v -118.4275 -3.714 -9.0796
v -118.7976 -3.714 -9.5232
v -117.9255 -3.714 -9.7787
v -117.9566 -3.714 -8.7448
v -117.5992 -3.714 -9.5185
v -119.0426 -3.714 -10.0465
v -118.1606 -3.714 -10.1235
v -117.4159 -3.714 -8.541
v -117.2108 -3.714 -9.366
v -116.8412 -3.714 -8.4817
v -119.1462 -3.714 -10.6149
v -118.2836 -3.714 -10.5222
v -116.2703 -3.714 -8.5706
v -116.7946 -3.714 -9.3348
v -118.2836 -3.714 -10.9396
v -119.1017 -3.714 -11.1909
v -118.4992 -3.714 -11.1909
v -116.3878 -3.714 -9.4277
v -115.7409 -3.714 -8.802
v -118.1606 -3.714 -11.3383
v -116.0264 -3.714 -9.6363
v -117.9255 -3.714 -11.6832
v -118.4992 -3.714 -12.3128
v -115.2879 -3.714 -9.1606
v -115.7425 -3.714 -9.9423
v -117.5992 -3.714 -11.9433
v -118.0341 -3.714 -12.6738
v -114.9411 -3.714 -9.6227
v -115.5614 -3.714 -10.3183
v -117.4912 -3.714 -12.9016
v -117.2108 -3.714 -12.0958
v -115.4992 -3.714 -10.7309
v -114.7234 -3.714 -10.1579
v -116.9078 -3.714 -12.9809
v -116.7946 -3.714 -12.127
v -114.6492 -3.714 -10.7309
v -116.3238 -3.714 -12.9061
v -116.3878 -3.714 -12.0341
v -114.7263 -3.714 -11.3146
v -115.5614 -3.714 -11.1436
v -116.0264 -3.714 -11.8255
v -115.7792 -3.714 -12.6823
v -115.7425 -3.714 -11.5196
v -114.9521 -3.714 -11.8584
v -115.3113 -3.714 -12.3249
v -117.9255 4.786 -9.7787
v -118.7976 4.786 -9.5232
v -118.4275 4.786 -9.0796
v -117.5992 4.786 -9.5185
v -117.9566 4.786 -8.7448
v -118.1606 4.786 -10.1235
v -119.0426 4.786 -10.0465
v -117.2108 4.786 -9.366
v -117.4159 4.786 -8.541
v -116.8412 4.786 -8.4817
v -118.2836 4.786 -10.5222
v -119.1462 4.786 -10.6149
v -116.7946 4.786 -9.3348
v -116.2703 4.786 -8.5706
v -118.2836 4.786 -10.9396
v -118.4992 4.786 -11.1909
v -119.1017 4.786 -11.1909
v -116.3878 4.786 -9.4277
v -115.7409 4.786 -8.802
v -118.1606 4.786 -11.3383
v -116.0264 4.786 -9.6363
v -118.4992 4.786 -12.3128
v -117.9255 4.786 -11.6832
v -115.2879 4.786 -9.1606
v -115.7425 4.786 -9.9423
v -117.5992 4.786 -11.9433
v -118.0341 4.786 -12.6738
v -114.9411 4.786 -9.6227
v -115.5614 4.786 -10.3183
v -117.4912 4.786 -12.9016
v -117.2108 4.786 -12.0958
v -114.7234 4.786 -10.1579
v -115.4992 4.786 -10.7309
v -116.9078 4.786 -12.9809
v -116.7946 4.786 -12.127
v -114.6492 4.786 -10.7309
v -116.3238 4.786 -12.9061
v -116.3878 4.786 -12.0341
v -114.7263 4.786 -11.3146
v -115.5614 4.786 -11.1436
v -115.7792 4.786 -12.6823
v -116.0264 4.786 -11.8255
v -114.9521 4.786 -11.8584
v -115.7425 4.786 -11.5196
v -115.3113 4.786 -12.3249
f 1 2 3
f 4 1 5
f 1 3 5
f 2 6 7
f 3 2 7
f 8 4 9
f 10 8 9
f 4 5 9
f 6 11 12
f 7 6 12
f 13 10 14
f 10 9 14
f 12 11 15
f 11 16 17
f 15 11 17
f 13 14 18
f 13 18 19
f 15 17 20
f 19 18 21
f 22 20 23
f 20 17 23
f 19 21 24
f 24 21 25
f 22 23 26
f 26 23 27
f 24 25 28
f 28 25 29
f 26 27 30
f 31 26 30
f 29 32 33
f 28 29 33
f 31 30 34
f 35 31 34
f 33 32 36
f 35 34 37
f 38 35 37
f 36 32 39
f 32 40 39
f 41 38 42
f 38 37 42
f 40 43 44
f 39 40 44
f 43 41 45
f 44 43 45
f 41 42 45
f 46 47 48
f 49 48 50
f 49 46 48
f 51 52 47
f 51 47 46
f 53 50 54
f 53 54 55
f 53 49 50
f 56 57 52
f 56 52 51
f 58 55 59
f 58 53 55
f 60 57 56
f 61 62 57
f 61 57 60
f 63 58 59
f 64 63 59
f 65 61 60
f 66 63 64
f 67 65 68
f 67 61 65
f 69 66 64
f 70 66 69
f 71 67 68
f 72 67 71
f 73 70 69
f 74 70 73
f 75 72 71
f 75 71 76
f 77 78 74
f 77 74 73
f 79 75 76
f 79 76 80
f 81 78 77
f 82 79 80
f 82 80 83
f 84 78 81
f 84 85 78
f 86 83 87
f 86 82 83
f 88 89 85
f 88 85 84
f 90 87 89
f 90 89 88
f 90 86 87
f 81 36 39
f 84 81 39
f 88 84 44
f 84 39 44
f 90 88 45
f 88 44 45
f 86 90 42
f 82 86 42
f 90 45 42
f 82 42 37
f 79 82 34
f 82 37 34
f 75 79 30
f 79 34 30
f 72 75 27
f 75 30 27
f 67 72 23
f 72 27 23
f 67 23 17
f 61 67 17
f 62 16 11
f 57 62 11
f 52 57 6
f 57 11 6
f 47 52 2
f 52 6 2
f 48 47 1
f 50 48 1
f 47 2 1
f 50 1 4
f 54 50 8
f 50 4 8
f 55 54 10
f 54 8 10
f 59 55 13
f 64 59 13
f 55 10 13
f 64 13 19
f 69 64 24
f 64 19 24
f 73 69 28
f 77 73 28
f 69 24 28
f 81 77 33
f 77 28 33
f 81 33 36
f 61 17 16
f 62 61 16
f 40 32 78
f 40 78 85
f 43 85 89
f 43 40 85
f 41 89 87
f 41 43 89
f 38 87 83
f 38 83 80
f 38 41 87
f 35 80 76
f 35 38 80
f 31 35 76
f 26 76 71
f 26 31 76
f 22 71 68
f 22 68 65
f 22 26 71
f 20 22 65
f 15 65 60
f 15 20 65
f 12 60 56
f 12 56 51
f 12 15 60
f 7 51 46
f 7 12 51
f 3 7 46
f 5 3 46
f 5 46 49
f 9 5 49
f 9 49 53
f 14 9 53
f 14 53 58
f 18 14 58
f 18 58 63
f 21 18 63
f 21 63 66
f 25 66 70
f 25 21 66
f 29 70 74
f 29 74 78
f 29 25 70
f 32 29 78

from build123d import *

# Parameters (mm, degrees)
SKETCH1_R           = 1.4
BOSS_EXTRUDE1_DEPTH = 8.5


with BuildPart() as part:
    # Sketch1 → Boss-Extrude1 (new body)
    with BuildSketch(Plane(origin=(0, -3.71400402, 0), x_dir=(1, 0, 0), z_dir=(0, 1, 0))):
        with BuildLine():
            ThreePointArc((-114.649243174, 10.730908874), (-116.044111605, 12.812074413), (-118.499243174, 12.312838076))
            Line((-118.499243174, 12.312838076), (-118.499243174, 11.190908874))
            Line((-118.499243174, 11.190908874), (-119.101719053, 11.190908874))
            ThreePointArc((-119.101719053, 11.190908874), (-117.130467384, 8.49282144), (-114.649243174, 10.730908874))
        make_face()
        with Locations((-116.899243174, 10.730908874)):
            Circle(SKETCH1_R, mode=Mode.SUBTRACT)
    extrude(amount=BOSS_EXTRUDE1_DEPTH)


solid = part.part
